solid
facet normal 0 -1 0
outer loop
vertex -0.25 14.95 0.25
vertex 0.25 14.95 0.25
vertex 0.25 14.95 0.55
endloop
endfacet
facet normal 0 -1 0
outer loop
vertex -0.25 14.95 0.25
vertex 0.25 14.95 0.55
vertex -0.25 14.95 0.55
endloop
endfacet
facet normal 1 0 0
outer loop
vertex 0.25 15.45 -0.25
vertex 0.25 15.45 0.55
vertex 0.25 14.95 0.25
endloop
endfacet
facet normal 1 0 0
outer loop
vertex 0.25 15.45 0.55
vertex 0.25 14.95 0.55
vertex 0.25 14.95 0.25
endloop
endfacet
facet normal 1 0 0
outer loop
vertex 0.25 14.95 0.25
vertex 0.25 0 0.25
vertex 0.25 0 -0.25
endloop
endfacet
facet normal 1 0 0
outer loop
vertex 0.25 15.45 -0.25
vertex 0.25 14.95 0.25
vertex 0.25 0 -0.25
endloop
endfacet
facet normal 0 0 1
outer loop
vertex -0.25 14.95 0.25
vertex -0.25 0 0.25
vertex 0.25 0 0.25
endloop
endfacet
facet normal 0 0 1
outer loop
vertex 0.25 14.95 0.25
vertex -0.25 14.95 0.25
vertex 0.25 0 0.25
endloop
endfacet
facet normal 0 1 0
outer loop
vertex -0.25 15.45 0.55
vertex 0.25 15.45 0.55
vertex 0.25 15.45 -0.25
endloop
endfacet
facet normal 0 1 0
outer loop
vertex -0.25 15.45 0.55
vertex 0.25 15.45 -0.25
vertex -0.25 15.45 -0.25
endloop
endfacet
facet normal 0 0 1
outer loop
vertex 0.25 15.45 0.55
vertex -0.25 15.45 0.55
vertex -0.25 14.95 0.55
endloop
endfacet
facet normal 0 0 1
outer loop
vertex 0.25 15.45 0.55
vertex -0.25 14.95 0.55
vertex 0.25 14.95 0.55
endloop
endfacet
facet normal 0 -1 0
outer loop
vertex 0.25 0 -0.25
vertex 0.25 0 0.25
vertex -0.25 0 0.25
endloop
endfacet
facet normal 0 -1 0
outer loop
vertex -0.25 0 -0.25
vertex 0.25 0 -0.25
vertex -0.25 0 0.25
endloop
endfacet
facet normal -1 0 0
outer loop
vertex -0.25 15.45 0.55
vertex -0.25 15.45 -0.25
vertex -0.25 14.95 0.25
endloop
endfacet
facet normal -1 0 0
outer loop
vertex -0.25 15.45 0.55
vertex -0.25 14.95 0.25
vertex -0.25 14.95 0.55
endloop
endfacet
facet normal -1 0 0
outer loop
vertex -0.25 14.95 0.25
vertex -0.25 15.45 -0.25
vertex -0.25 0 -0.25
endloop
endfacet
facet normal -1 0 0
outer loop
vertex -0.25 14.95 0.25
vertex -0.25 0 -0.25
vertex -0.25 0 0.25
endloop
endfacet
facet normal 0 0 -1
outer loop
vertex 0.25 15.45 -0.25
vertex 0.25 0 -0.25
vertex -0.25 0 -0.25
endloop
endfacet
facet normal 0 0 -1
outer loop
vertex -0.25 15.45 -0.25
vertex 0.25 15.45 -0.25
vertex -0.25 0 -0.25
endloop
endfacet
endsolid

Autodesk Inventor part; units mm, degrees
ref_plane "YZ Plane" through (0, 0, 0) normal (1, 0, 0) x (0, 1, 0)
ref_plane "XZ Plane" through (0, 0, 0) normal (0, 1, 0) x (-1, 0, 0)
ref_plane "XY Plane" through (0, 0, 0) normal (0, 0, 1) x (1, 0, 0)
sketch "Sketch1" plane through (0, 0, 0) normal (0, 1, 0) x (-1, 0, 0)
  line L0 (0.25, 0.25) -> (-0.25, 0.25)
  line L1 (-0.25, 0.25) -> (-0.25, -0.25)
  line L2 (-0.25, -0.25) -> (0.25, -0.25)
  line L3 (0.25, -0.25) -> (0.25, 0.25)
  line L4 (0.25, 0.25) -> (-0.25, -0.25) construction
  line L5 (-0.25, 0.25) -> (0.25, -0.25) construction
  point P0 (0, 0)
  dimension "d0" = 0.5
  dimension "d1" = 0.5
extrude "Extrusion1" add sketch "Sketch1" along normal blind 15.45
sketch "Sketch2" plane through (-0.25, 0, 0.25) normal (0, 0, 1) x (1, 0, 0)
  line L0 (0, 0) -> (0, 15.45) projected
  line L1 (0.5, 0) -> (0.5, 15.45) projected
  line L2 (0, 15.45) -> (0.5, 15.45)
  line L3 (0.5, 15.45) -> (0.5, 14.95)
  line L4 (0.5, 14.95) -> (0, 14.95)
  line L5 (0, 14.95) -> (0, 15.45)
  point P0 (0.25, 0)
  point P1 (0, 14.95)
  dimension "d4" = 0.5
extrude "Extrusion2" add sketch "Sketch2" along normal blind 0.3
properties part number "jst-ph-5p_wire"
